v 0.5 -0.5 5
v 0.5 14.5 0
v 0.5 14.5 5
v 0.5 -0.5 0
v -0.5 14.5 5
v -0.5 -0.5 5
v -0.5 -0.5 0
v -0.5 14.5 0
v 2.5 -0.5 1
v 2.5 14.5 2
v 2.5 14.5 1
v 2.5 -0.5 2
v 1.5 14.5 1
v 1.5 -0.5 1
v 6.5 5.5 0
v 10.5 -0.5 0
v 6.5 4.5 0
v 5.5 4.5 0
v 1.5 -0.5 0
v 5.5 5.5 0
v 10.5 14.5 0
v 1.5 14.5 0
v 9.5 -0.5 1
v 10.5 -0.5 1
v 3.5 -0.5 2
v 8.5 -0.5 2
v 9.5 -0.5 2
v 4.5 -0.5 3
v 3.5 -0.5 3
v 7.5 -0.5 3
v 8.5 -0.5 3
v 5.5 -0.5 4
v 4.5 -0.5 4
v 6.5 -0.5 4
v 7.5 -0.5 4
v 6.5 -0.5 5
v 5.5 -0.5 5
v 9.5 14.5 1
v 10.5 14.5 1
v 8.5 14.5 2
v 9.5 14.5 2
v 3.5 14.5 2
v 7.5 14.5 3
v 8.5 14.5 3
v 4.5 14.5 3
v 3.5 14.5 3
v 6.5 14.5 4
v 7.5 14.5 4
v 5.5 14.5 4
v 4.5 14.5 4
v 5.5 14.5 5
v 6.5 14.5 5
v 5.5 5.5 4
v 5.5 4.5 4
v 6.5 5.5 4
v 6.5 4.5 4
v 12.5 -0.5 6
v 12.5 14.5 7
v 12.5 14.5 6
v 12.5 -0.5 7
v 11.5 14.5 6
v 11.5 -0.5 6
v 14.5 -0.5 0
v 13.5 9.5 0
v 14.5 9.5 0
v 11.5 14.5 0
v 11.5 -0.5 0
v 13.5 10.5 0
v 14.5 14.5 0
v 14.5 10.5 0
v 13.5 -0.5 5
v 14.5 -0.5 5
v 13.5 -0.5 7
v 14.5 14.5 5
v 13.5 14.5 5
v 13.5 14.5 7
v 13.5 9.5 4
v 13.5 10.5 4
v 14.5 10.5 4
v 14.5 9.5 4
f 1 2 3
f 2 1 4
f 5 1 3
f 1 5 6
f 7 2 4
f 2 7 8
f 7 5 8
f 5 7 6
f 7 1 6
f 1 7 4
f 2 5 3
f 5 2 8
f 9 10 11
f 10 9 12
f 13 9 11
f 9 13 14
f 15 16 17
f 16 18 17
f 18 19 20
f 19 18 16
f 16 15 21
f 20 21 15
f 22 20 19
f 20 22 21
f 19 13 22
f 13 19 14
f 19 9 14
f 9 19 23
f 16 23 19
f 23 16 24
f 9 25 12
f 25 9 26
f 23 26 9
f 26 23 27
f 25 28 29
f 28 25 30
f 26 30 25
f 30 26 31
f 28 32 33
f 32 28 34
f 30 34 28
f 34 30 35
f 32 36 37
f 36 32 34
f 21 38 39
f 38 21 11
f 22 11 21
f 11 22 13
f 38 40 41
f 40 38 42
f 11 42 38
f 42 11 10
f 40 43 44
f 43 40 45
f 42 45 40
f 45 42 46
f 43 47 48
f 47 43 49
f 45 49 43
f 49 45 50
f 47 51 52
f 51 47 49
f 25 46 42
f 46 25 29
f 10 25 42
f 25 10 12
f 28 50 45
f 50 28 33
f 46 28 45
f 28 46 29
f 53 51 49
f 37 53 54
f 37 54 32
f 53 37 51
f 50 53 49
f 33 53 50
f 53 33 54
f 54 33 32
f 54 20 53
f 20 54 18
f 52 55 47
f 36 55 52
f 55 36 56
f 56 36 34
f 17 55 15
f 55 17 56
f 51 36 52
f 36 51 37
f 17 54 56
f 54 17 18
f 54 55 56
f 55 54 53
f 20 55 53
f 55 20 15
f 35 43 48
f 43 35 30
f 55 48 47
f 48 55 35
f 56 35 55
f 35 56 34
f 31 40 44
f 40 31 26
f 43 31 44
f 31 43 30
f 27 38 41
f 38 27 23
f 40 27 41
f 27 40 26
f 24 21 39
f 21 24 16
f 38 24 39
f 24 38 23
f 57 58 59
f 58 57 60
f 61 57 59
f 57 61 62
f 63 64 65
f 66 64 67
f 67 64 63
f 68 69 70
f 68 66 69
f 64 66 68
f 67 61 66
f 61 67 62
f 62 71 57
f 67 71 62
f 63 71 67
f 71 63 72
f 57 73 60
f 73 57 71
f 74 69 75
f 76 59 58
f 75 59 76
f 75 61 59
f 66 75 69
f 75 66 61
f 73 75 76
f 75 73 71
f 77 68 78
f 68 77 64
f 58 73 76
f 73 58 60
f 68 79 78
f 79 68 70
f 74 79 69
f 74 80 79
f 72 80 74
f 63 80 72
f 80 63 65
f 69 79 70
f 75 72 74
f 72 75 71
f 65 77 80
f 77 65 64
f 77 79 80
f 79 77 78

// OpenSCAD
union() {
    translate([0, 0, 2.5]) cube([1, 1, 5], center=true);
    translate([0, 1, 2.5]) cube([1, 1, 5], center=true);
    translate([0, 2, 2.5]) cube([1, 1, 5], center=true);
    translate([0, 3, 2.5]) cube([1, 1, 5], center=true);
    translate([0, 4, 2.5]) cube([1, 1, 5], center=true);
    translate([0, 5, 2.5]) cube([1, 1, 5], center=true);
    translate([0, 6, 2.5]) cube([1, 1, 5], center=true);
    translate([0, 7, 2.5]) cube([1, 1, 5], center=true);
    translate([0, 8, 2.5]) cube([1, 1, 5], center=true);
    translate([0, 9, 2.5]) cube([1, 1, 5], center=true);
    translate([0, 10, 2.5]) cube([1, 1, 5], center=true);
    translate([0, 11, 2.5]) cube([1, 1, 5], center=true);
    translate([0, 12, 2.5]) cube([1, 1, 5], center=true);
    translate([0, 13, 2.5]) cube([1, 1, 5], center=true);
    translate([0, 14, 2.5]) cube([1, 1, 5], center=true);
    translate([2, 0, 0.5]) cube([1, 1, 1], center=true);
    translate([2, 1, 0.5]) cube([1, 1, 1], center=true);
    translate([2, 2, 0.5]) cube([1, 1, 1], center=true);
    translate([2, 3, 0.5]) cube([1, 1, 1], center=true);
    translate([2, 4, 0.5]) cube([1, 1, 1], center=true);
    translate([2, 5, 0.5]) cube([1, 1, 1], center=true);
    translate([2, 6, 0.5]) cube([1, 1, 1], center=true);
    translate([2, 7, 0.5]) cube([1, 1, 1], center=true);
    translate([2, 8, 0.5]) cube([1, 1, 1], center=true);
    translate([2, 9, 0.5]) cube([1, 1, 1], center=true);
    translate([2, 10, 0.5]) cube([1, 1, 1], center=true);
    translate([2, 11, 0.5]) cube([1, 1, 1], center=true);
    translate([2, 12, 0.5]) cube([1, 1, 1], center=true);
    translate([2, 13, 0.5]) cube([1, 1, 1], center=true);
    translate([2, 14, 0.5]) cube([1, 1, 1], center=true);
    translate([3, 0, 1.0]) cube([1, 1, 2], center=true);
    translate([3, 1, 1.0]) cube([1, 1, 2], center=true);
    translate([3, 2, 1.0]) cube([1, 1, 2], center=true);
    translate([3, 3, 1.0]) cube([1, 1, 2], center=true);
    translate([3, 4, 1.0]) cube([1, 1, 2], center=true);
    translate([3, 5, 1.0]) cube([1, 1, 2], center=true);
    translate([3, 6, 1.0]) cube([1, 1, 2], center=true);
    translate([3, 7, 1.0]) cube([1, 1, 2], center=true);
    translate([3, 8, 1.0]) cube([1, 1, 2], center=true);
    translate([3, 9, 1.0]) cube([1, 1, 2], center=true);
    translate([3, 10, 1.0]) cube([1, 1, 2], center=true);
    translate([3, 11, 1.0]) cube([1, 1, 2], center=true);
    translate([3, 12, 1.0]) cube([1, 1, 2], center=true);
    translate([3, 13, 1.0]) cube([1, 1, 2], center=true);
    translate([3, 14, 1.0]) cube([1, 1, 2], center=true);
    translate([4, 0, 1.5]) cube([1, 1, 3], center=true);
    translate([4, 1, 1.5]) cube([1, 1, 3], center=true);
    translate([4, 2, 1.5]) cube([1, 1, 3], center=true);
    translate([4, 3, 1.5]) cube([1, 1, 3], center=true);
    translate([4, 4, 1.5]) cube([1, 1, 3], center=true);
    translate([4, 5, 1.5]) cube([1, 1, 3], center=true);
    translate([4, 6, 1.5]) cube([1, 1, 3], center=true);
    translate([4, 7, 1.5]) cube([1, 1, 3], center=true);
    translate([4, 8, 1.5]) cube([1, 1, 3], center=true);
    translate([4, 9, 1.5]) cube([1, 1, 3], center=true);
    translate([4, 10, 1.5]) cube([1, 1, 3], center=true);
    translate([4, 11, 1.5]) cube([1, 1, 3], center=true);
    translate([4, 12, 1.5]) cube([1, 1, 3], center=true);
    translate([4, 13, 1.5]) cube([1, 1, 3], center=true);
    translate([4, 14, 1.5]) cube([1, 1, 3], center=true);
    translate([5, 0, 2.0]) cube([1, 1, 4], center=true);
    translate([5, 1, 2.0]) cube([1, 1, 4], center=true);
    translate([5, 2, 2.0]) cube([1, 1, 4], center=true);
    translate([5, 3, 2.0]) cube([1, 1, 4], center=true);
    translate([5, 4, 2.0]) cube([1, 1, 4], center=true);
    translate([5, 5, 2.0]) cube([1, 1, 4], center=true);
    translate([5, 6, 2.0]) cube([1, 1, 4], center=true);
    translate([5, 7, 2.0]) cube([1, 1, 4], center=true);
    translate([5, 8, 2.0]) cube([1, 1, 4], center=true);
    translate([5, 9, 2.0]) cube([1, 1, 4], center=true);
    translate([5, 10, 2.0]) cube([1, 1, 4], center=true);
    translate([5, 11, 2.0]) cube([1, 1, 4], center=true);
    translate([5, 12, 2.0]) cube([1, 1, 4], center=true);
    translate([5, 13, 2.0]) cube([1, 1, 4], center=true);
    translate([5, 14, 2.0]) cube([1, 1, 4], center=true);
    translate([6, 0, 2.5]) cube([1, 1, 5], center=true);
    translate([6, 1, 2.5]) cube([1, 1, 5], center=true);
    translate([6, 2, 2.5]) cube([1, 1, 5], center=true);
    translate([6, 3, 2.5]) cube([1, 1, 5], center=true);
    translate([6, 4, 2.5]) cube([1, 1, 5], center=true);
    translate([6, 5, 4.5]) color([1, 0, 0]) cube([1, 1, 1], center=true);
    translate([6, 6, 2.5]) cube([1, 1, 5], center=true);
    translate([6, 7, 2.5]) cube([1, 1, 5], center=true);
    translate([6, 8, 2.5]) cube([1, 1, 5], center=true);
    translate([6, 9, 2.5]) cube([1, 1, 5], center=true);
    translate([6, 10, 2.5]) cube([1, 1, 5], center=true);
    translate([6, 11, 2.5]) cube([1, 1, 5], center=true);
    translate([6, 12, 2.5]) cube([1, 1, 5], center=true);
    translate([6, 13, 2.5]) cube([1, 1, 5], center=true);
    translate([6, 14, 2.5]) cube([1, 1, 5], center=true);
    translate([7, 0, 2.0]) cube([1, 1, 4], center=true);
    translate([7, 1, 2.0]) cube([1, 1, 4], center=true);
    translate([7, 2, 2.0]) cube([1, 1, 4], center=true);
    translate([7, 3, 2.0]) cube([1, 1, 4], center=true);
    translate([7, 4, 2.0]) cube([1, 1, 4], center=true);
    translate([7, 5, 2.0]) cube([1, 1, 4], center=true);
    translate([7, 6, 2.0]) cube([1, 1, 4], center=true);
    translate([7, 7, 2.0]) cube([1, 1, 4], center=true);
    translate([7, 8, 2.0]) cube([1, 1, 4], center=true);
    translate([7, 9, 2.0]) cube([1, 1, 4], center=true);
    translate([7, 10, 2.0]) cube([1, 1, 4], center=true);
    translate([7, 11, 2.0]) cube([1, 1, 4], center=true);
    translate([7, 12, 2.0]) cube([1, 1, 4], center=true);
    translate([7, 13, 2.0]) cube([1, 1, 4], center=true);
    translate([7, 14, 2.0]) cube([1, 1, 4], center=true);
    translate([8, 0, 1.5]) cube([1, 1, 3], center=true);
    translate([8, 1, 1.5]) cube([1, 1, 3], center=true);
    translate([8, 2, 1.5]) cube([1, 1, 3], center=true);
    translate([8, 3, 1.5]) cube([1, 1, 3], center=true);
    translate([8, 4, 1.5]) cube([1, 1, 3], center=true);
    translate([8, 5, 1.5]) cube([1, 1, 3], center=true);
    translate([8, 6, 1.5]) cube([1, 1, 3], center=true);
    translate([8, 7, 1.5]) cube([1, 1, 3], center=true);
    translate([8, 8, 1.5]) cube([1, 1, 3], center=true);
    translate([8, 9, 1.5]) cube([1, 1, 3], center=true);
    translate([8, 10, 1.5]) cube([1, 1, 3], center=true);
    translate([8, 11, 1.5]) cube([1, 1, 3], center=true);
    translate([8, 12, 1.5]) cube([1, 1, 3], center=true);
    translate([8, 13, 1.5]) cube([1, 1, 3], center=true);
    translate([8, 14, 1.5]) cube([1, 1, 3], center=true);
    translate([9, 0, 1.0]) cube([1, 1, 2], center=true);
    translate([9, 1, 1.0]) cube([1, 1, 2], center=true);
    translate([9, 2, 1.0]) cube([1, 1, 2], center=true);
    translate([9, 3, 1.0]) cube([1, 1, 2], center=true);
    translate([9, 4, 1.0]) cube([1, 1, 2], center=true);
    translate([9, 5, 1.0]) cube([1, 1, 2], center=true);
    translate([9, 6, 1.0]) cube([1, 1, 2], center=true);
    translate([9, 7, 1.0]) cube([1, 1, 2], center=true);
    translate([9, 8, 1.0]) cube([1, 1, 2], center=true);
    translate([9, 9, 1.0]) cube([1, 1, 2], center=true);
    translate([9, 10, 1.0]) cube([1, 1, 2], center=true);
    translate([9, 11, 1.0]) cube([1, 1, 2], center=true);
    translate([9, 12, 1.0]) cube([1, 1, 2], center=true);
    translate([9, 13, 1.0]) cube([1, 1, 2], center=true);
    translate([9, 14, 1.0]) cube([1, 1, 2], center=true);
    translate([10, 0, 0.5]) cube([1, 1, 1], center=true);
    translate([10, 1, 0.5]) cube([1, 1, 1], center=true);
    translate([10, 2, 0.5]) cube([1, 1, 1], center=true);
    translate([10, 3, 0.5]) cube([1, 1, 1], center=true);
    translate([10, 4, 0.5]) cube([1, 1, 1], center=true);
    translate([10, 5, 0.5]) cube([1, 1, 1], center=true);
    translate([10, 6, 0.5]) cube([1, 1, 1], center=true);
    translate([10, 7, 0.5]) cube([1, 1, 1], center=true);
    translate([10, 8, 0.5]) cube([1, 1, 1], center=true);
    translate([10, 9, 0.5]) cube([1, 1, 1], center=true);
    translate([10, 10, 0.5]) cube([1, 1, 1], center=true);
    translate([10, 11, 0.5]) cube([1, 1, 1], center=true);
    translate([10, 12, 0.5]) cube([1, 1, 1], center=true);
    translate([10, 13, 0.5]) cube([1, 1, 1], center=true);
    translate([10, 14, 0.5]) cube([1, 1, 1], center=true);
    translate([12, 0, 3.0]) cube([1, 1, 6], center=true);
    translate([12, 1, 3.0]) cube([1, 1, 6], center=true);
    translate([12, 2, 3.0]) cube([1, 1, 6], center=true);
    translate([12, 3, 3.0]) cube([1, 1, 6], center=true);
    translate([12, 4, 3.0]) cube([1, 1, 6], center=true);
    translate([12, 5, 3.0]) cube([1, 1, 6], center=true);
    translate([12, 6, 3.0]) cube([1, 1, 6], center=true);
    translate([12, 7, 3.0]) cube([1, 1, 6], center=true);
    translate([12, 8, 3.0]) cube([1, 1, 6], center=true);
    translate([12, 9, 3.0]) cube([1, 1, 6], center=true);
    translate([12, 10, 3.0]) cube([1, 1, 6], center=true);
    translate([12, 11, 3.0]) cube([1, 1, 6], center=true);
    translate([12, 12, 3.0]) cube([1, 1, 6], center=true);
    translate([12, 13, 3.0]) cube([1, 1, 6], center=true);
    translate([12, 14, 3.0]) cube([1, 1, 6], center=true);
    translate([13, 0, 3.5]) cube([1, 1, 7], center=true);
    translate([13, 1, 3.5]) cube([1, 1, 7], center=true);
    translate([13, 2, 3.5]) cube([1, 1, 7], center=true);
    translate([13, 3, 3.5]) cube([1, 1, 7], center=true);
    translate([13, 4, 3.5]) cube([1, 1, 7], center=true);
    translate([13, 5, 3.5]) cube([1, 1, 7], center=true);
    translate([13, 6, 3.5]) cube([1, 1, 7], center=true);
    translate([13, 7, 3.5]) cube([1, 1, 7], center=true);
    translate([13, 8, 3.5]) cube([1, 1, 7], center=true);
    translate([13, 9, 3.5]) cube([1, 1, 7], center=true);
    translate([13, 10, 3.5]) cube([1, 1, 7], center=true);
    translate([13, 11, 3.5]) cube([1, 1, 7], center=true);
    translate([13, 12, 3.5]) cube([1, 1, 7], center=true);
    translate([13, 13, 3.5]) cube([1, 1, 7], center=true);
    translate([13, 14, 3.5]) cube([1, 1, 7], center=true);
    translate([14, 0, 2.5]) cube([1, 1, 5], center=true);
    translate([14, 1, 2.5]) cube([1, 1, 5], center=true);
    translate([14, 2, 2.5]) cube([1, 1, 5], center=true);
    translate([14, 3, 2.5]) cube([1, 1, 5], center=true);
    translate([14, 4, 2.5]) cube([1, 1, 5], center=true);
    translate([14, 5, 2.5]) cube([1, 1, 5], center=true);
    translate([14, 6, 2.5]) cube([1, 1, 5], center=true);
    translate([14, 7, 2.5]) cube([1, 1, 5], center=true);
    translate([14, 8, 2.5]) cube([1, 1, 5], center=true);
    translate([14, 9, 2.5]) cube([1, 1, 5], center=true);
    translate([14, 10, 4.5]) color([0, 0, 1]) cube([1, 1, 1], center=true);
    translate([14, 11, 2.5]) cube([1, 1, 5], center=true);
    translate([14, 12, 2.5]) cube([1, 1, 5], center=true);
    translate([14, 13, 2.5]) cube([1, 1, 5], center=true);
    translate([14, 14, 2.5]) cube([1, 1, 5], center=true);
}
